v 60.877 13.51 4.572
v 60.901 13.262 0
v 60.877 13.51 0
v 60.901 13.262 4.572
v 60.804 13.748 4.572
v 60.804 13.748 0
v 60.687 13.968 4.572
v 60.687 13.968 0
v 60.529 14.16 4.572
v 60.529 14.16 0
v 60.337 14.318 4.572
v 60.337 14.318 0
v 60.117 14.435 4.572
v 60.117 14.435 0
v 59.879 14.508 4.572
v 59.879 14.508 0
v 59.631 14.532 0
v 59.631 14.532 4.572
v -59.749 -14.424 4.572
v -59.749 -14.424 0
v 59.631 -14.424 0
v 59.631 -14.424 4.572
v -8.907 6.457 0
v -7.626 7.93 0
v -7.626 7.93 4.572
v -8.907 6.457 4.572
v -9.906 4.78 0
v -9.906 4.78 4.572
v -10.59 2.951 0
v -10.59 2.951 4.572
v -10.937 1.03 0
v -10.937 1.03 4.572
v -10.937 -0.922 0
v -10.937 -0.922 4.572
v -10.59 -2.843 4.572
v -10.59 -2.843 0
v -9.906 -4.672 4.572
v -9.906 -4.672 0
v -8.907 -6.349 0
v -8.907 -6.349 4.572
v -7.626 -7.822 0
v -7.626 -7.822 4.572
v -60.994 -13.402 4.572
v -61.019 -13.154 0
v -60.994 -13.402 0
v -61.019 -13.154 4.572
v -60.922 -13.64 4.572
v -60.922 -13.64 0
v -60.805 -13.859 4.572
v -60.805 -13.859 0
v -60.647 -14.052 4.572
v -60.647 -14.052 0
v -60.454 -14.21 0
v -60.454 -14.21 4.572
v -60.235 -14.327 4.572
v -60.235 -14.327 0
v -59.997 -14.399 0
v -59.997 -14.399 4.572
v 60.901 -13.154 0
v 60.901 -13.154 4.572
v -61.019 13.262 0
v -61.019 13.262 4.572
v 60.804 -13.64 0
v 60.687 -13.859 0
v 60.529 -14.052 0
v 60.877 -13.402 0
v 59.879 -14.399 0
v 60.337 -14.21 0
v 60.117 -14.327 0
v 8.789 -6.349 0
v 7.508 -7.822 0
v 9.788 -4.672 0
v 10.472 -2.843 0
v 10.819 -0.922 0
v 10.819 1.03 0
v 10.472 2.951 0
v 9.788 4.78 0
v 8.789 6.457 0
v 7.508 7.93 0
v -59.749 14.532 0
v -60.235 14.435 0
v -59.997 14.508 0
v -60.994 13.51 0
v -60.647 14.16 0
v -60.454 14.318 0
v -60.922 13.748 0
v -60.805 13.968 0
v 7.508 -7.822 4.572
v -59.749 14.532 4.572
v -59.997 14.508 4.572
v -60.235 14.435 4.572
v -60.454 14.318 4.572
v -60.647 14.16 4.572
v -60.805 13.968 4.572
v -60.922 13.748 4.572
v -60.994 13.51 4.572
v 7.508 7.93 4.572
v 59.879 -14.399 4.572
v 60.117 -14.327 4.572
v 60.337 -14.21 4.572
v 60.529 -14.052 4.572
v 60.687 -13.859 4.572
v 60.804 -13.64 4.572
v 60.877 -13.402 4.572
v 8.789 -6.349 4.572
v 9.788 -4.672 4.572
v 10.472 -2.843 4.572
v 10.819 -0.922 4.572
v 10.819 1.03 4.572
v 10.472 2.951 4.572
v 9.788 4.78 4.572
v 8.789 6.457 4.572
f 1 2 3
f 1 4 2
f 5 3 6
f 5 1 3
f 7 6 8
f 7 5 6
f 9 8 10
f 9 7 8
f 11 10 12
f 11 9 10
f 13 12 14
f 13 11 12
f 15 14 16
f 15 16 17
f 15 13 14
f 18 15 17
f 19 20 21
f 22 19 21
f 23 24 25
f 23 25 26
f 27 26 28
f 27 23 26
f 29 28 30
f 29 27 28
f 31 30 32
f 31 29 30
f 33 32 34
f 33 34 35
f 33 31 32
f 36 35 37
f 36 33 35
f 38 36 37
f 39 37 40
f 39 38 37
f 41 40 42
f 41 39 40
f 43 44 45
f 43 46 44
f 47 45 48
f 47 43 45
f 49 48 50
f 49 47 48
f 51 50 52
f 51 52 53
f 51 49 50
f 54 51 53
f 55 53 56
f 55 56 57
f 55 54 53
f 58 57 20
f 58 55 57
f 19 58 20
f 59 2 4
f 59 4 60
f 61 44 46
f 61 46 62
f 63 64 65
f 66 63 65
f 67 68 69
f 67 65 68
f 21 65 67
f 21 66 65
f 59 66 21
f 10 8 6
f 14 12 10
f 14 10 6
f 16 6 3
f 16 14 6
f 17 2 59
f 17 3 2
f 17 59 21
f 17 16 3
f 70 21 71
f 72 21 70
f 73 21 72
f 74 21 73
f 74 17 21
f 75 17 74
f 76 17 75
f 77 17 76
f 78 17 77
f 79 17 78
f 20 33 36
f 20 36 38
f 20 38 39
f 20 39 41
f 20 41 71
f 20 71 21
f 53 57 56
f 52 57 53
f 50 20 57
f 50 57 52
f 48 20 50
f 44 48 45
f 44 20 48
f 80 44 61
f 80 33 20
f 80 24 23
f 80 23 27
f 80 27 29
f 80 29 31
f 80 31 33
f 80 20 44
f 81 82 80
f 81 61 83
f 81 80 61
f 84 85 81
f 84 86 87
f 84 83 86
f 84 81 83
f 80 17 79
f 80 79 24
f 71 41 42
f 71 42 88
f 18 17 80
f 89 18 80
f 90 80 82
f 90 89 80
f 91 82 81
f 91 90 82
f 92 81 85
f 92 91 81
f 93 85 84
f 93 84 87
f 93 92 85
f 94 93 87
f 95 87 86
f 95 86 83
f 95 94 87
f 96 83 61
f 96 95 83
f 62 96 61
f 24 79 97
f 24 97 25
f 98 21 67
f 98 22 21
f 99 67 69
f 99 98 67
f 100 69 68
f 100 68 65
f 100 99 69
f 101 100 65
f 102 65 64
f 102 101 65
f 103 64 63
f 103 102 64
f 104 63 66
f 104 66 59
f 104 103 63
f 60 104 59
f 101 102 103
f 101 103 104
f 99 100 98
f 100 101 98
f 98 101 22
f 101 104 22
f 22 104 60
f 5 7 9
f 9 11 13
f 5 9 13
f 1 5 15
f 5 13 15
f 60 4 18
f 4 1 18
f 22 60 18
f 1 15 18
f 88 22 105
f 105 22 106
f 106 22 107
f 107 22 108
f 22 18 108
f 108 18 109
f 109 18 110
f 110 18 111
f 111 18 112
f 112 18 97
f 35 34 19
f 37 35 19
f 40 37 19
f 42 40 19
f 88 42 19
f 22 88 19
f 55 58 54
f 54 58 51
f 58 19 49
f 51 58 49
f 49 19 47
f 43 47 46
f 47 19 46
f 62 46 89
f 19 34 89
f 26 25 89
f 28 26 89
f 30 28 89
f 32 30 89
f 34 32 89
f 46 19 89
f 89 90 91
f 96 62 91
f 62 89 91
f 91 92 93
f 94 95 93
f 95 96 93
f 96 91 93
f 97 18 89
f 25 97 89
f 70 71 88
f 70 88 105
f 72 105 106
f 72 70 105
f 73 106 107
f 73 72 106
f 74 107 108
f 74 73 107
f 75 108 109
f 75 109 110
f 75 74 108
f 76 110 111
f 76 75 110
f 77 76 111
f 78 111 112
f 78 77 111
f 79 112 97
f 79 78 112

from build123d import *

# Parameters (mm, degrees)
BOSS_EXTRUDE1_DEPTH = 4.572
FILLET3_R           = 1.27
FILLET4_R           = 1.27
FILLET5_R           = 1.27
FILLET6_R           = 1.27


with BuildPart() as part:
    # Sketch1 → Boss-Extrude1 (new body)
    with BuildSketch(Plane.XY):
        Polygon((60.901141121, 14.532138101), (60.901141121, -14.423861899), (-0.058858879, -14.423861899), (-61.018858879, -14.423861899), (-61.018858879, 14.532138101), (-0.058858879, 14.532138101), align=None)
        with BuildLine():
            ThreePointArc((-7.625635449, 7.93030318), (-10.980858879, 0.054138101), (-7.625635449, -7.822026977))
            Line((-7.625635449, -7.822026977), (7.507917691, -7.822026977))
            ThreePointArc((7.507917691, -7.822026977), (10.863141121, 0.054138101), (7.507917691, 7.93030318))
            Line((7.507917691, 7.93030318), (-7.625635449, 7.93030318))
        make_face(mode=Mode.SUBTRACT)
    extrude(amount=BOSS_EXTRUDE1_DEPTH)

    # Fillet3
    fillet3_edges = [part.edges().sort_by_distance(p)[0] for p in [
        (-61.018858879, 14.532138101, 2.286),
    ]]
    fillet(fillet3_edges, radius=FILLET3_R)

    # Fillet4
    fillet4_edges = [part.edges().sort_by_distance(p)[0] for p in [
        (-61.018858879, -14.423861899, 2.286),
    ]]
    fillet(fillet4_edges, radius=FILLET4_R)

    # Fillet5
    fillet5_edges = [part.edges().sort_by_distance(p)[0] for p in [
        (60.901141121, -14.423861899, 2.286),
    ]]
    fillet(fillet5_edges, radius=FILLET5_R)

    # Fillet6
    fillet6_edges = [part.edges().sort_by_distance(p)[0] for p in [
        (60.901141121, 14.532138101, 2.286),
    ]]
    fillet(fillet6_edges, radius=FILLET6_R)


solid = part.part
